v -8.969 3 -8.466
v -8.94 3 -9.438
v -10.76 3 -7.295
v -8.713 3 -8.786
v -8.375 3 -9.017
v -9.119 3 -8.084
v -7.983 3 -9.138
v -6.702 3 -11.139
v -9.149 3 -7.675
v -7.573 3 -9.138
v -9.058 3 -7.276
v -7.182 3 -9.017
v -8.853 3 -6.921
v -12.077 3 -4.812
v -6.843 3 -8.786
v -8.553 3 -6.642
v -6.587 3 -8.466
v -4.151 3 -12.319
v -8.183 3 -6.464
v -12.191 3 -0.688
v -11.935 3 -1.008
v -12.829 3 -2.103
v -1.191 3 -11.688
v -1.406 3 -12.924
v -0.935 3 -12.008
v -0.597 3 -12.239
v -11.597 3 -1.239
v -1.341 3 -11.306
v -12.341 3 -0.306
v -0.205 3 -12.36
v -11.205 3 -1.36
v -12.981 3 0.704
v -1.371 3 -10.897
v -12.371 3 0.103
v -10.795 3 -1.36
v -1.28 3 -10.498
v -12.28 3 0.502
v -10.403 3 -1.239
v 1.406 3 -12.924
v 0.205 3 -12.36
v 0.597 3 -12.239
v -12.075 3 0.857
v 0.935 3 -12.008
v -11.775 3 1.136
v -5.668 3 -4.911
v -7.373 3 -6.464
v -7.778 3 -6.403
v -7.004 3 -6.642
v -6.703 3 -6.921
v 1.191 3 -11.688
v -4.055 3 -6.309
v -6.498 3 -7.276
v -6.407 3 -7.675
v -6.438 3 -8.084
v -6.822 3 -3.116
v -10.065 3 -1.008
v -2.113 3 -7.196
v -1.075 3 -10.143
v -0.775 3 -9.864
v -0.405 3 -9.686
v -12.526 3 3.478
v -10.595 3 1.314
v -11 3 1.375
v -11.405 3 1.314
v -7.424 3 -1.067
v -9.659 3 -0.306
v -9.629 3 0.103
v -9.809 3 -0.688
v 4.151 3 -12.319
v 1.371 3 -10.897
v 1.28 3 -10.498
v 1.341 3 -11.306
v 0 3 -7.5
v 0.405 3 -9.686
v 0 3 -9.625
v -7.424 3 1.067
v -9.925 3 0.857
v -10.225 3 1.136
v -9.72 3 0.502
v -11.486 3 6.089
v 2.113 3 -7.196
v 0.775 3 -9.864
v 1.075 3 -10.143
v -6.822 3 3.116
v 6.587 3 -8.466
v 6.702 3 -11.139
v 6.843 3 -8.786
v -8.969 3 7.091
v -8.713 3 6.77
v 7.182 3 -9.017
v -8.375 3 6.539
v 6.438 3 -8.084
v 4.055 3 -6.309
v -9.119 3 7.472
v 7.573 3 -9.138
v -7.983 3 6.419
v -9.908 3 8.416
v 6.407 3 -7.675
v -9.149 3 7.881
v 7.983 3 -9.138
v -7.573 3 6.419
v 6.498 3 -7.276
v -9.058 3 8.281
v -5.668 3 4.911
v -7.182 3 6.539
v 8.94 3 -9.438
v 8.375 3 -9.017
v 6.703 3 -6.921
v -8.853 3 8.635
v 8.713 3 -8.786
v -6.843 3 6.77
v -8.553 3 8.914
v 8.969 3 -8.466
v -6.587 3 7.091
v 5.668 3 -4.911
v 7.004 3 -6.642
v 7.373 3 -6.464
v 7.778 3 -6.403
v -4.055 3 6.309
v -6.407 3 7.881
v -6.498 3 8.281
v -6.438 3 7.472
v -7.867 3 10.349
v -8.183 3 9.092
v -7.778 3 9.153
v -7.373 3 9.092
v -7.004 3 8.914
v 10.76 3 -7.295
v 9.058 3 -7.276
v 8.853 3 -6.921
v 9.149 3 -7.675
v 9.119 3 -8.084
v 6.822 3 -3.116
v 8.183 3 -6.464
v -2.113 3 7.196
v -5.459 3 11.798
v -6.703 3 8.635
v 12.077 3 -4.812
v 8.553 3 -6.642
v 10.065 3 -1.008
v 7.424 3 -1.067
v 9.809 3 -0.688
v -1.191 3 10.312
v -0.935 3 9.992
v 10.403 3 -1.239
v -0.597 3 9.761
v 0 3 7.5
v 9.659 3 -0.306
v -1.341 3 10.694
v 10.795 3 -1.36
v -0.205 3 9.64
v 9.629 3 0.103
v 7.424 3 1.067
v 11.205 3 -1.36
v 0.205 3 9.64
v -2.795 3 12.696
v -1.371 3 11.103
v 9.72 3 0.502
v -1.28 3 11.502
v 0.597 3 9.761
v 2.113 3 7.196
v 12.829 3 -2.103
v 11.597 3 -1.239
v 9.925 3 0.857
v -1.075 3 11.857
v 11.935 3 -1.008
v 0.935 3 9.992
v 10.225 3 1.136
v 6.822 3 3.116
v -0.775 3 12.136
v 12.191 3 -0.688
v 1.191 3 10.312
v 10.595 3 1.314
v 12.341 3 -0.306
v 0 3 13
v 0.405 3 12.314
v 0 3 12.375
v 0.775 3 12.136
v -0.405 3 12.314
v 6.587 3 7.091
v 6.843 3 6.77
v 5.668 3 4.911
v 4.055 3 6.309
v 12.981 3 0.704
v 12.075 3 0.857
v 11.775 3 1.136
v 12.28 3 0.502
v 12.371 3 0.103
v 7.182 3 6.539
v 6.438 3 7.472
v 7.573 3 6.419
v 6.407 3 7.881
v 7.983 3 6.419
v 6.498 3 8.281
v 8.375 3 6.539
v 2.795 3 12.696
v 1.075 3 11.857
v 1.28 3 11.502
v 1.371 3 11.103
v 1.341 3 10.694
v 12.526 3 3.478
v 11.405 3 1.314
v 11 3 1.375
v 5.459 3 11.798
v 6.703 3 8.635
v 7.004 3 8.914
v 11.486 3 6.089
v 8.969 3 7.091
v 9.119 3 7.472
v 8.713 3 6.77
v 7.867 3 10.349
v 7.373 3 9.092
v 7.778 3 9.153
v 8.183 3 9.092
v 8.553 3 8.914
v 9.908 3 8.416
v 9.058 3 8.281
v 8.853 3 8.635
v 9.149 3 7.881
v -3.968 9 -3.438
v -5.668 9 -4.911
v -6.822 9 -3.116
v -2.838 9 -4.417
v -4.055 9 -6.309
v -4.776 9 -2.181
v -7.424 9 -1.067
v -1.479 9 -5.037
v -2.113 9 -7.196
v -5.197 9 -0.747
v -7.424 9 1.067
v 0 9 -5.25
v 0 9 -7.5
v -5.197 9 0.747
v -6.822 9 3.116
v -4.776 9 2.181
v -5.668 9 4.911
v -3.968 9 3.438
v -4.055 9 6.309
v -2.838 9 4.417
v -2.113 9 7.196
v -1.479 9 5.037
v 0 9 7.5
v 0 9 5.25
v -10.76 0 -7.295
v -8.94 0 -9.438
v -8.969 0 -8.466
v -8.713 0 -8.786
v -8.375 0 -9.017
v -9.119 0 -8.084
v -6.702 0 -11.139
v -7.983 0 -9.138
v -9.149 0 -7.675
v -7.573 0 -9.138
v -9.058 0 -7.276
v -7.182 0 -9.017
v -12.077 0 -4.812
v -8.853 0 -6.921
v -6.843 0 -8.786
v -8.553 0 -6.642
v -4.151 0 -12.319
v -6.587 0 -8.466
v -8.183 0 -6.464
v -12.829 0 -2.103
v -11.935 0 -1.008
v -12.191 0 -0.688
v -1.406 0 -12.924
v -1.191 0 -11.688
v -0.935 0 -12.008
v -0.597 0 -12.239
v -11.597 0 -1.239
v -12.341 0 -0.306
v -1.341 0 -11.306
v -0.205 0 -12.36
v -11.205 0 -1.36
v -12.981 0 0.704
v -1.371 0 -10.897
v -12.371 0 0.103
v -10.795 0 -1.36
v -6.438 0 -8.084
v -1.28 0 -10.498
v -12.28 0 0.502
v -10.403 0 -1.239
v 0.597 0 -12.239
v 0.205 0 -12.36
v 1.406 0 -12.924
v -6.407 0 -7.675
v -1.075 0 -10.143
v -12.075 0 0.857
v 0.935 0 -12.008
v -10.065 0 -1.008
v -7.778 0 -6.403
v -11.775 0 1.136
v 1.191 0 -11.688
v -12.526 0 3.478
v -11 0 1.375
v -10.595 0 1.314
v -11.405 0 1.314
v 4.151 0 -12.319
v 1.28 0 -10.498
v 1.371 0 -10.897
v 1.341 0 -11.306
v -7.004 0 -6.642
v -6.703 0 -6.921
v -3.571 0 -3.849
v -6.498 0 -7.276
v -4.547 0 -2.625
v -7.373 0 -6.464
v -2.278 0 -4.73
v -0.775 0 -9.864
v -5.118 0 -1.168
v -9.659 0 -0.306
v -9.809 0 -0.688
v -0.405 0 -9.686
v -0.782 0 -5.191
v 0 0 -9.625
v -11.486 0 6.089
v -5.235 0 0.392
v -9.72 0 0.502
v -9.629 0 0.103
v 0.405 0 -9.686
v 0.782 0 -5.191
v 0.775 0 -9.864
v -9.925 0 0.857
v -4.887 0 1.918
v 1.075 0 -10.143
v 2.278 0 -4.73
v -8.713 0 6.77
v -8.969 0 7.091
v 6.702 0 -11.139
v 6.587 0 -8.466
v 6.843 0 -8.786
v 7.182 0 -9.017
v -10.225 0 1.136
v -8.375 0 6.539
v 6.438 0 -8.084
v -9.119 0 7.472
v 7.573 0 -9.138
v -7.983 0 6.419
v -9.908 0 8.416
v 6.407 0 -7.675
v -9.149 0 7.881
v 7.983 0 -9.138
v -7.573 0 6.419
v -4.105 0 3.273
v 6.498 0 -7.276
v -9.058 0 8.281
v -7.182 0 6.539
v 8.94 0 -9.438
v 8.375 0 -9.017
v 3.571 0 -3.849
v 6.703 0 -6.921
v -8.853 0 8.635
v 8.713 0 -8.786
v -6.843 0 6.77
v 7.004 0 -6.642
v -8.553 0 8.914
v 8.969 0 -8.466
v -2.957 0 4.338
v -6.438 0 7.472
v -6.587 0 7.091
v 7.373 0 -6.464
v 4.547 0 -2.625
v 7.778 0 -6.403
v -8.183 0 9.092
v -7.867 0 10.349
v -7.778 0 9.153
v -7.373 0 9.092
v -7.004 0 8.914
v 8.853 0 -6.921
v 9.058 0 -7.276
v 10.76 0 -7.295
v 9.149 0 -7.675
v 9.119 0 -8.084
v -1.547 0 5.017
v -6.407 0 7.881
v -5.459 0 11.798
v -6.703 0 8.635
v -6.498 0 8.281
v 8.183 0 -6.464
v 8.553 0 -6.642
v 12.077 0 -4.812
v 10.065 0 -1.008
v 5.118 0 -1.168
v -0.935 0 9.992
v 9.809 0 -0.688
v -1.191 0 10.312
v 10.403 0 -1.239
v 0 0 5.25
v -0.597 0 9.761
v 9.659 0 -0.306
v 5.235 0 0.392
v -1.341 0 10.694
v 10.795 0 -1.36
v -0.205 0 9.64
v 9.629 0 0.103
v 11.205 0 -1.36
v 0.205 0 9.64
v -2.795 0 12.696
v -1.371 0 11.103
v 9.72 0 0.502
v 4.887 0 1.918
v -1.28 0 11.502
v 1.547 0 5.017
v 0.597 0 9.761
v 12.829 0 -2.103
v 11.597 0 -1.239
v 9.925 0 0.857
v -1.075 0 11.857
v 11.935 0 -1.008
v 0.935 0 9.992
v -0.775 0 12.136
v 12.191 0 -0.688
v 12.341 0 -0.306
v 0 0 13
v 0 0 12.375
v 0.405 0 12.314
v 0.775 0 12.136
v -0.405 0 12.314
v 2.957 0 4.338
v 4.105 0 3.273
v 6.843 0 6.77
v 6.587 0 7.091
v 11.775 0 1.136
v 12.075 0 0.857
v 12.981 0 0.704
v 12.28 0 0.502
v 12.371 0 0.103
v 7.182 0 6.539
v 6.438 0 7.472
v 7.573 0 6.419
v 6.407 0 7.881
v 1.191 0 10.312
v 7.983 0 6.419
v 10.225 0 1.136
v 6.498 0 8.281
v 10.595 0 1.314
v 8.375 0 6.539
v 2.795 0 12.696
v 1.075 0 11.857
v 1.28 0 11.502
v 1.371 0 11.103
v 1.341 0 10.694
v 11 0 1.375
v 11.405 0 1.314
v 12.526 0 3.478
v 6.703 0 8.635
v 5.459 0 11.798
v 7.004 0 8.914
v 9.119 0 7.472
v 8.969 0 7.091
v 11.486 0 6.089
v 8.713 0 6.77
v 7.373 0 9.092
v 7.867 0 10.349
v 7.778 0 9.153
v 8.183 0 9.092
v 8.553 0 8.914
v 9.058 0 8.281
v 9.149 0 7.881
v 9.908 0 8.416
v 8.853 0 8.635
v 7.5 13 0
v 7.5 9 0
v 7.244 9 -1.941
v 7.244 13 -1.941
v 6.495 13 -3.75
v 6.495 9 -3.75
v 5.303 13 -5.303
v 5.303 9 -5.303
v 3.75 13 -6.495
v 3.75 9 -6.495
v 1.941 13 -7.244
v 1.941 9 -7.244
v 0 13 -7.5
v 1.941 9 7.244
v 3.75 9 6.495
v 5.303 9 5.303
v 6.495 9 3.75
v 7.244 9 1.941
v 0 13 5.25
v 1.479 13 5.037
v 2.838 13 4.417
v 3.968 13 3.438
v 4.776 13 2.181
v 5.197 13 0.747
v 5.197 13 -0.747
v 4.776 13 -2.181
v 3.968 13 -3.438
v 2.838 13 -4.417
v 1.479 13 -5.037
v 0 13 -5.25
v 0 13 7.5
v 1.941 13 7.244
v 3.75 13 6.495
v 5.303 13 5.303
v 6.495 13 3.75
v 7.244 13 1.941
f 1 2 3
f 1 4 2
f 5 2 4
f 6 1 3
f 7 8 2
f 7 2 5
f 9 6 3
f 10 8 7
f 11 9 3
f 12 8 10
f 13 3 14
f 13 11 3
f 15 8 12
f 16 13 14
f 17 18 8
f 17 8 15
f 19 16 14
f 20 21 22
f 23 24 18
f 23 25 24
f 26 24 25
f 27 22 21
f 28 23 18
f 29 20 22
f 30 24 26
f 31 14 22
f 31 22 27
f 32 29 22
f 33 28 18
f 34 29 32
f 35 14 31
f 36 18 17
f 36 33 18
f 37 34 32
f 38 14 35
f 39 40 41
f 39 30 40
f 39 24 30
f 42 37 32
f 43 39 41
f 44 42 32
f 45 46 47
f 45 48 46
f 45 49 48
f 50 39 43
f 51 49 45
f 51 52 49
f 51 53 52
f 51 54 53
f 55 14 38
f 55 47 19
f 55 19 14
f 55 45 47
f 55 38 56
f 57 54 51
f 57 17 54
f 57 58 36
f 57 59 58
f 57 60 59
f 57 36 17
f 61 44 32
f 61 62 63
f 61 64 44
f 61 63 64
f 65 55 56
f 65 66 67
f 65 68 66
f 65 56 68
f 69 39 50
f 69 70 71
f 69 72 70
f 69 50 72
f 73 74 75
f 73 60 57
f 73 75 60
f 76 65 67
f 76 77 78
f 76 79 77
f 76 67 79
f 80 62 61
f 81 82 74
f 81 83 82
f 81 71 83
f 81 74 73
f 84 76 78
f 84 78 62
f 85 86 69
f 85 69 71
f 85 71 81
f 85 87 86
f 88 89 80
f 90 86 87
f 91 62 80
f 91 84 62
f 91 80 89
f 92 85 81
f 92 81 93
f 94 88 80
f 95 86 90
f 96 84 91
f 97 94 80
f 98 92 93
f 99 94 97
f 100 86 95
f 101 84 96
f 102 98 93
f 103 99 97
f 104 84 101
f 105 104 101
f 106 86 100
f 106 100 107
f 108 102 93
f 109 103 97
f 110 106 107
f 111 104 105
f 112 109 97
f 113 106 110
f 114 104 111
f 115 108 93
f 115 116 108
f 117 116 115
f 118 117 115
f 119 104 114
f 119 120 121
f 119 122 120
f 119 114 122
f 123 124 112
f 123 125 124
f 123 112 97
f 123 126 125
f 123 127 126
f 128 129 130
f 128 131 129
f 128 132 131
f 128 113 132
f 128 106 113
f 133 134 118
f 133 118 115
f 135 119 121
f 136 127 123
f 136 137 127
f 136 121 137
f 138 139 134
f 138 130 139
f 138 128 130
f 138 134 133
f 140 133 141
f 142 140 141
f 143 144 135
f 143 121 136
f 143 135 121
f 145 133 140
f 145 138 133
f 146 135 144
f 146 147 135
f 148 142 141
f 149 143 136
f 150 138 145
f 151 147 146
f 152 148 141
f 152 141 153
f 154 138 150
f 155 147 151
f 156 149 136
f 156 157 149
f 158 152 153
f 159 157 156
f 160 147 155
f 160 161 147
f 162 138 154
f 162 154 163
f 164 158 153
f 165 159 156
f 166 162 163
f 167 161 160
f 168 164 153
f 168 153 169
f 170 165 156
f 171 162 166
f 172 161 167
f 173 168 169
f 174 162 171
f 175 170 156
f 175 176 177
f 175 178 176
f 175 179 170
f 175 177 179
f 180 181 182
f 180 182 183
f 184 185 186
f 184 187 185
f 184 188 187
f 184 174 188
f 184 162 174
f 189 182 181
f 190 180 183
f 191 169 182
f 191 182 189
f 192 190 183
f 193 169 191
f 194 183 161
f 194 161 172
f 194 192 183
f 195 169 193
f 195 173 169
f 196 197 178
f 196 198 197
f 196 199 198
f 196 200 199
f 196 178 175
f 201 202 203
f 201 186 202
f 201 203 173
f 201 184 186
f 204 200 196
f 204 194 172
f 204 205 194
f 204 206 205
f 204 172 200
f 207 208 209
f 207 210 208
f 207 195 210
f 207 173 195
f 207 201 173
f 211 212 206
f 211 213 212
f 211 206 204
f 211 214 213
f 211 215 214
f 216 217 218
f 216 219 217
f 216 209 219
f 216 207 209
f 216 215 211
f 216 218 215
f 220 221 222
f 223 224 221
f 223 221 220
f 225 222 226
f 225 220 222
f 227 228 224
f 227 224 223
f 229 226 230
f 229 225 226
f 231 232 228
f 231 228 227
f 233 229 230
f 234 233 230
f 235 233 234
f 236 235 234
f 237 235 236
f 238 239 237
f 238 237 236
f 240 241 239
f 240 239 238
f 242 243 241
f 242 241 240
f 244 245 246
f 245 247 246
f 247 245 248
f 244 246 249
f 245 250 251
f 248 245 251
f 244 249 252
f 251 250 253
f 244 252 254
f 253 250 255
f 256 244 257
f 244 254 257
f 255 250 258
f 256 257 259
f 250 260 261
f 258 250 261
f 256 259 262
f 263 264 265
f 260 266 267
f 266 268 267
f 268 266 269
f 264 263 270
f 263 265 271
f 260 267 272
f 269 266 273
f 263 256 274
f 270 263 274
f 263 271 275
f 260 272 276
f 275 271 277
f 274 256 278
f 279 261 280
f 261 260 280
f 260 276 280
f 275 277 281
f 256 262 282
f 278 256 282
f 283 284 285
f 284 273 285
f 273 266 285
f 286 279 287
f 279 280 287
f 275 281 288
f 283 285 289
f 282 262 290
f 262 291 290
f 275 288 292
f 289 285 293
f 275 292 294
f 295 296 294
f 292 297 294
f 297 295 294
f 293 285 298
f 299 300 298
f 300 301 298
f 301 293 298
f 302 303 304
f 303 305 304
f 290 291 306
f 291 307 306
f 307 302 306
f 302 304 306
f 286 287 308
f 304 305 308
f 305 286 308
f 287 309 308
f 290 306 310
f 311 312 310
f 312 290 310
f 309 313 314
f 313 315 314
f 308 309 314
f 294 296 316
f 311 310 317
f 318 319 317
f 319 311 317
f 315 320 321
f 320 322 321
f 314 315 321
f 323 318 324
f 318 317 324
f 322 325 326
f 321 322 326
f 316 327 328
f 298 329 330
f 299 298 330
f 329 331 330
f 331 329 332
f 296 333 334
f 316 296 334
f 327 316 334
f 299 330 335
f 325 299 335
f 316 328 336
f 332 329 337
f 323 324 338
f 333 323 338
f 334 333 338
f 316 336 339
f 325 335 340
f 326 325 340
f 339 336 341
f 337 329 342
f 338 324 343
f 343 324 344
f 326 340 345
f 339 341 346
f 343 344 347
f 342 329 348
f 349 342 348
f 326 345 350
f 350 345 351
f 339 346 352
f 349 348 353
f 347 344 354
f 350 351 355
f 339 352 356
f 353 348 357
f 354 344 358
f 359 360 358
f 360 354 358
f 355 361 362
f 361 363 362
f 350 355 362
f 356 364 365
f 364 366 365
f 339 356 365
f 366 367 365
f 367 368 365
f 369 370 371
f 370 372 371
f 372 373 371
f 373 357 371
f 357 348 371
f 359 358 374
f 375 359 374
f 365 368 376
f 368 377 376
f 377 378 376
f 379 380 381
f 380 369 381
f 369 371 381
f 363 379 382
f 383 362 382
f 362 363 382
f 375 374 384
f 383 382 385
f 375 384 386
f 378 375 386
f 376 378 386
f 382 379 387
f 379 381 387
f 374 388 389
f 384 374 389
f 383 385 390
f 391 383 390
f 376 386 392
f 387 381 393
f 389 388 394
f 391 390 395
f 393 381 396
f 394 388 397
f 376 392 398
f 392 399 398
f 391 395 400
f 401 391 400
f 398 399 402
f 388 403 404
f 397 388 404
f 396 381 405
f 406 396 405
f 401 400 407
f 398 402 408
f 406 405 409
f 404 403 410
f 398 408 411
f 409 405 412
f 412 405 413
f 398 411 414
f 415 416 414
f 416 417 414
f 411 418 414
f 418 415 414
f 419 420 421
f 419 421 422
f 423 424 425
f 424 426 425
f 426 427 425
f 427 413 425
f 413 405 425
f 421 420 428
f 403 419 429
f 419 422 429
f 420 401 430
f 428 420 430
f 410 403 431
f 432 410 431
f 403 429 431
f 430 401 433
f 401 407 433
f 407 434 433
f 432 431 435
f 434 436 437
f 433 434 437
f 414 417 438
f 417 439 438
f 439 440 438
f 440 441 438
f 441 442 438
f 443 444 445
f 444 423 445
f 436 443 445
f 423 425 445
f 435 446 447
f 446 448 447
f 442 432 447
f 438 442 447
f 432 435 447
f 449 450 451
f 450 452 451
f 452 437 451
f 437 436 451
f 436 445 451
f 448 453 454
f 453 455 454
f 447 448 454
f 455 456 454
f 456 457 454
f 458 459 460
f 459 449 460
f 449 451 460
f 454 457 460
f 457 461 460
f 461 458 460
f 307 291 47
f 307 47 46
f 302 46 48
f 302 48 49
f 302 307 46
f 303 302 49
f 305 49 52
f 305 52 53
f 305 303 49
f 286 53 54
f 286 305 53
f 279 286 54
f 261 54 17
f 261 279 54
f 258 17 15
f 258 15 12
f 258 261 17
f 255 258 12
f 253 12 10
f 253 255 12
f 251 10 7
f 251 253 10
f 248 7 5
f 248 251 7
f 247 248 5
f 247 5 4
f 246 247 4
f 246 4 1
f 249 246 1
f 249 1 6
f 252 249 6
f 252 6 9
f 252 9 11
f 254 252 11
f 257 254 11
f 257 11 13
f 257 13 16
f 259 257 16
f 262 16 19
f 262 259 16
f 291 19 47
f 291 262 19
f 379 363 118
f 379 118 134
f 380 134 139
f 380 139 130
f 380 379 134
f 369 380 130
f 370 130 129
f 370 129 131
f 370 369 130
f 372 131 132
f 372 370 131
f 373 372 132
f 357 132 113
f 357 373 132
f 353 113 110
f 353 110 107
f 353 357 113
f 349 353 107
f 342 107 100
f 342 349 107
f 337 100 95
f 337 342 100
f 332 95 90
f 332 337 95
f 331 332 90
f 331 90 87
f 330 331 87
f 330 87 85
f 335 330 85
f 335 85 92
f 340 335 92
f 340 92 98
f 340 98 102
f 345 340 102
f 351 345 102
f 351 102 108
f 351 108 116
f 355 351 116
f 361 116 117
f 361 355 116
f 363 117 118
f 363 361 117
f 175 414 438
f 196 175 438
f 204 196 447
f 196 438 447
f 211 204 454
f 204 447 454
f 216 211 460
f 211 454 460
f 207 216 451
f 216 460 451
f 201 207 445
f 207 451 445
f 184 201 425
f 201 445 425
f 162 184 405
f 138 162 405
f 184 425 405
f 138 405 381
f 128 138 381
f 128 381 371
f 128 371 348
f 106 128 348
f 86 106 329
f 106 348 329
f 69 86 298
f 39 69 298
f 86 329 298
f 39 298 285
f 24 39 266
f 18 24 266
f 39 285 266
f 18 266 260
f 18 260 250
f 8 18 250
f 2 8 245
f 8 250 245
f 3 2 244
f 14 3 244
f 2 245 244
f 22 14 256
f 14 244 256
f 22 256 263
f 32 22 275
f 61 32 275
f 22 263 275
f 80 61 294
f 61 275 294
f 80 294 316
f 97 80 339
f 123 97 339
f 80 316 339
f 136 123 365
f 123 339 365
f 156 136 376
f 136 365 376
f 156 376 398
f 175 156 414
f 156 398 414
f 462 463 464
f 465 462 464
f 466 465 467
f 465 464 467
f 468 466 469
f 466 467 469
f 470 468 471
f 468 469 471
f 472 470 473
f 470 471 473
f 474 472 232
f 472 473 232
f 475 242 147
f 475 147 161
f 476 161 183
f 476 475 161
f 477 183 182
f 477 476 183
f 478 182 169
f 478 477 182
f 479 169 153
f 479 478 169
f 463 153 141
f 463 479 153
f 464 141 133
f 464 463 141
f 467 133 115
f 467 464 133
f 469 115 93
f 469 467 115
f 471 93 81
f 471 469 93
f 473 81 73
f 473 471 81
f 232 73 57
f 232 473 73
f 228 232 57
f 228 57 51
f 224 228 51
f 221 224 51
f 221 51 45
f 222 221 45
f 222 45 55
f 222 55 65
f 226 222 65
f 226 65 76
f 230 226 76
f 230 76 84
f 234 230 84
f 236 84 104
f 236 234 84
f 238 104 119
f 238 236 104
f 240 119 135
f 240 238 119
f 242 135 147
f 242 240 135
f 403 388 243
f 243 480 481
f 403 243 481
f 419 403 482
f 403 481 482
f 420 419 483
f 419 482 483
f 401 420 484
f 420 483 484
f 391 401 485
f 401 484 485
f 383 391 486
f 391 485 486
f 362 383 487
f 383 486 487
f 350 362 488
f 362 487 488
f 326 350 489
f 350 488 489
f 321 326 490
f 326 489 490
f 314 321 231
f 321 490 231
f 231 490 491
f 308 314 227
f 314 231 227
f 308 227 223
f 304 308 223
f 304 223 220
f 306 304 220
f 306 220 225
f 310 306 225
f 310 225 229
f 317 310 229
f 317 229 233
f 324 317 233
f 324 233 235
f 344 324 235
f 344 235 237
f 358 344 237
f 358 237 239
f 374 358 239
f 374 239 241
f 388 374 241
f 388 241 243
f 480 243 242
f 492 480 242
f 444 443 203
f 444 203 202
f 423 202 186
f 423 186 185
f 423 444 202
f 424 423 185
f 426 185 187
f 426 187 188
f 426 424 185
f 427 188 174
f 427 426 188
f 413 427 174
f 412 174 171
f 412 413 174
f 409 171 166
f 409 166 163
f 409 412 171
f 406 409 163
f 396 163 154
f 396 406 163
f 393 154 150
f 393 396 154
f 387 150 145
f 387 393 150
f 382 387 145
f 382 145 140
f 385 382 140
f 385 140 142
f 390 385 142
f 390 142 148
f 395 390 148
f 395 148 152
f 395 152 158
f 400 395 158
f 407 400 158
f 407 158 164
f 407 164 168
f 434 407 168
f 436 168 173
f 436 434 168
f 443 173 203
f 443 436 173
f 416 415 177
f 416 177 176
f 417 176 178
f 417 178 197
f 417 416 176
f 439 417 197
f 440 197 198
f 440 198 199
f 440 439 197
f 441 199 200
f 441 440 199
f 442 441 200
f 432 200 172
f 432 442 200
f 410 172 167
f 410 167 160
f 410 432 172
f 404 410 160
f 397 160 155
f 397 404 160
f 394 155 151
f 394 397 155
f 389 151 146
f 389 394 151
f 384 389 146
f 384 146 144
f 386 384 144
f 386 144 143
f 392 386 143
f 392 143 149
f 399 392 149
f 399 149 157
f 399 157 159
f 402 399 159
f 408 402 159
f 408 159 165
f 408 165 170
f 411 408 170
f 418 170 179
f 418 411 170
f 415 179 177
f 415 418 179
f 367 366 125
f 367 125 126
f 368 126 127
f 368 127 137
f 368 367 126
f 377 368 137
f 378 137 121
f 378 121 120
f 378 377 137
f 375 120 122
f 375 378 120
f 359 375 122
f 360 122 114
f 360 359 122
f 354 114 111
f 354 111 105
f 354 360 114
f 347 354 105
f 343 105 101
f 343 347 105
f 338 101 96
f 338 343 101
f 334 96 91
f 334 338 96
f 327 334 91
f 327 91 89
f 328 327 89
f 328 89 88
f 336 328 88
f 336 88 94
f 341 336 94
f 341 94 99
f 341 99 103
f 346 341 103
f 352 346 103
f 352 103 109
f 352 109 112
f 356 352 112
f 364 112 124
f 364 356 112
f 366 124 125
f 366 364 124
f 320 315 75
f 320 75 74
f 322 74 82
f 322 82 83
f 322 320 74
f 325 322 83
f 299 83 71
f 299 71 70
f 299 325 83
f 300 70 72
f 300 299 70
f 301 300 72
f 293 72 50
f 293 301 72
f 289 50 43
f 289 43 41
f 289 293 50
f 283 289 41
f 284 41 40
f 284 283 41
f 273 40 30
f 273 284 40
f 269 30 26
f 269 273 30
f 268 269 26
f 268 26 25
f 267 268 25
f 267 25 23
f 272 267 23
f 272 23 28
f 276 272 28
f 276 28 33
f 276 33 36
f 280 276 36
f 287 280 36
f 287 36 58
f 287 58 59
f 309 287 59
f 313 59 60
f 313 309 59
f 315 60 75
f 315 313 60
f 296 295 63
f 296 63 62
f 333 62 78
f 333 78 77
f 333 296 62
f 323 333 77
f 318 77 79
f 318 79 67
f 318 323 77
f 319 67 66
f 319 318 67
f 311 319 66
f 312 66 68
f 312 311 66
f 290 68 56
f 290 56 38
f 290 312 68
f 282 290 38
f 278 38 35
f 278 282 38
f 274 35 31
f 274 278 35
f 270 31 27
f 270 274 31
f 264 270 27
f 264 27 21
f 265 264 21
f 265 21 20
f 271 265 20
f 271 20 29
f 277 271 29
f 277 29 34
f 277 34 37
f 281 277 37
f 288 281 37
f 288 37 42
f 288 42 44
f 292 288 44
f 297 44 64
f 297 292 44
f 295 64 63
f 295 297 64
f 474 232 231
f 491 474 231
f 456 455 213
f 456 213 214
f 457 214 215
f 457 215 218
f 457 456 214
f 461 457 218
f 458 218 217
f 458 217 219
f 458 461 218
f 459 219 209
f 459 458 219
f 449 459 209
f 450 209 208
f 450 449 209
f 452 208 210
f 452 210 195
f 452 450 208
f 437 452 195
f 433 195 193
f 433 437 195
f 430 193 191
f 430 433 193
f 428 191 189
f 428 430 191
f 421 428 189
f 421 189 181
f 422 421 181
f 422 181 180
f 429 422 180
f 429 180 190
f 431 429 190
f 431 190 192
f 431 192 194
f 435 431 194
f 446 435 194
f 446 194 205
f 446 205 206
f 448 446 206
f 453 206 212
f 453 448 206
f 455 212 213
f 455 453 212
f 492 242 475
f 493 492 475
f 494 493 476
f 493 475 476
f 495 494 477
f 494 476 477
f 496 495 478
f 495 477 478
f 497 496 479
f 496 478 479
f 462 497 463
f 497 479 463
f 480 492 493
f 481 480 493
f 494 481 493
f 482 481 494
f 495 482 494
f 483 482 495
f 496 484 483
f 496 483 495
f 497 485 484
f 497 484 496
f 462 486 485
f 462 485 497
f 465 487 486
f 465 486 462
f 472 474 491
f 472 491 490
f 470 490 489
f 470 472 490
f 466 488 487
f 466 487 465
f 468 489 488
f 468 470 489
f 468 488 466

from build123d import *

# Parameters (mm, degrees)
SKETCH1_R           = 13
SKETCH1_R_2         = 1.375
SKETCH1_R_3         = 5
BOSS_EXTRUDE1_DEPTH = 3
SKETCH2_R           = 7.5
SKETCH2_R_2         = 5
BOSS_EXTRUDE2_DEPTH = 10
SKETCH3_R           = 5.25
CUT_EXTRUDE1_DEPTH  = 18
CUT_EXTRUDE2_DEPTH  = 4
CUT_EXTRUDE3_START  = -10
SKETCH5_R           = 7.5
SKETCH5_R_2         = 7.45
CUT_EXTRUDE3_DEPTH  = 10
SKETCH6_R           = 7.5
SKETCH6_R_2         = 5.25
BOSS_EXTRUDE3_DEPTH = 6
BOSS_EXTRUDE4_DEPTH = 4


with BuildPart() as part:
    # Sketch1 → Boss-Extrude1 (new body)
    with BuildSketch(Plane(origin=(0, 0, 0), x_dir=(1, 0, 0), z_dir=(0, 1, 0))):
        with Locations(Location((0, 0, 0), (0, 0, 270))):
            Circle(SKETCH1_R)
        with Locations(Location((0, 11, 0), (0, 0, 270))):
            Circle(SKETCH1_R_2, mode=Mode.SUBTRACT)
        with Locations(Location((7.778174593, 7.778174593, 0), (0, 0, 270))):
            Circle(SKETCH1_R_2, mode=Mode.SUBTRACT)
        with Locations(Location((11, 0, 0), (0, 0, 270))):
            Circle(SKETCH1_R_2, mode=Mode.SUBTRACT)
        with Locations(Location((7.778174593, -7.778174593, 0), (0, 0, 270))):
            Circle(SKETCH1_R_2, mode=Mode.SUBTRACT)
        with Locations(Location((0, -11, 0), (0, 0, 270))):
            Circle(SKETCH1_R_2, mode=Mode.SUBTRACT)
        with Locations(Location((-7.778174593, -7.778174593, 0), (0, 0, 270))):
            Circle(SKETCH1_R_2, mode=Mode.SUBTRACT)
        with Locations(Location((-11, 0, 0), (0, 0, 270))):
            Circle(SKETCH1_R_2, mode=Mode.SUBTRACT)
        with Locations(Location((-7.778174593, 7.778174593, 0), (0, 0, 270))):
            Circle(SKETCH1_R_2, mode=Mode.SUBTRACT)
        with Locations(Location((0, 0, 0), (0, 0, 270))):
            Circle(SKETCH1_R_3, mode=Mode.SUBTRACT)
    extrude(amount=BOSS_EXTRUDE1_DEPTH)

    # Sketch2 → Boss-Extrude2 (add)
    with BuildSketch(Plane(origin=(0, 3, 0), x_dir=(1, 0, 0), z_dir=(0, 1, 0))):
        with Locations(Location((0, 0, 0), (0, 0, 270))):
            Circle(SKETCH2_R)
        with Locations(Location((0, 0, 0), (0, 0, 270))):
            Circle(SKETCH2_R_2, mode=Mode.SUBTRACT)
    extrude(amount=BOSS_EXTRUDE2_DEPTH)

    # Sketch3 → Cut-Extrude1 (cut)
    with BuildSketch(Plane(origin=(0, 13, 0), x_dir=(1, 0, 0), z_dir=(0, 1, 0))):
        with Locations(Location((0, 0, 0), (0, 0, 270))):
            Circle(SKETCH3_R)
    extrude(amount=-CUT_EXTRUDE1_DEPTH, mode=Mode.SUBTRACT)

    # Sketch4 → Cut-Extrude2 (cut)
    with BuildSketch(Plane(origin=(0, 13, 0), x_dir=(1, 0, 0), z_dir=(0, 1, 0))):
        with BuildLine():
            Line((0, 5.25), (0, 7.5))
            ThreePointArc((0, 7.5), (-7.5, 0), (0, -7.5))
            Line((0, -7.5), (0, -5.25))
            ThreePointArc((0, -5.25), (-5.25, 0), (0, 5.25))
        make_face()
    extrude(amount=-CUT_EXTRUDE2_DEPTH, mode=Mode.SUBTRACT)

    # Sketch5 → Cut-Extrude3 (cut)
    with BuildSketch(Plane(origin=(0, 13, 0), x_dir=(1, 0, 0), z_dir=(0, 1, 0)).offset(CUT_EXTRUDE3_START)):
        Circle(SKETCH5_R)
        with Locations(Location((0, 0, 0), (0, 0, 270))):
            Circle(SKETCH5_R_2, mode=Mode.SUBTRACT)
    extrude(amount=CUT_EXTRUDE3_DEPTH, mode=Mode.SUBTRACT)

    # Sketch6 → Boss-Extrude3 (add)
    with BuildSketch(Plane(origin=(0, 9, 0), x_dir=(1, 0, 0), z_dir=(0, 1, 0))):
        with Locations(Location((0, 0, 0), (0, 0, 270))):
            Circle(SKETCH6_R)
        with Locations(Location((0, 0, 0), (0, 0, 270))):
            Circle(SKETCH6_R_2, mode=Mode.SUBTRACT)
    extrude(amount=-BOSS_EXTRUDE3_DEPTH)

    # Sketch7 → Boss-Extrude4 (add)
    with BuildSketch(Plane(origin=(0, 9, 0), x_dir=(1, 0, 0), z_dir=(0, 1, 0))):
        with BuildLine():
            ThreePointArc((7.5, 0), (5.303300859, 5.303300859), (0, 7.5))
            Line((0, 7.5), (0, 7.45))
            ThreePointArc((0, 7.45), (5.26794552, 5.26794552), (7.45, 0))
            ThreePointArc((7.45, 0), (5.26794552, -5.26794552), (0, -7.45))
            Line((0, -7.45), (0, -7.5))
            ThreePointArc((0, -7.5), (5.303300859, -5.303300859), (7.5, 0))
        make_face()
    extrude(amount=BOSS_EXTRUDE4_DEPTH)


solid = part.part
